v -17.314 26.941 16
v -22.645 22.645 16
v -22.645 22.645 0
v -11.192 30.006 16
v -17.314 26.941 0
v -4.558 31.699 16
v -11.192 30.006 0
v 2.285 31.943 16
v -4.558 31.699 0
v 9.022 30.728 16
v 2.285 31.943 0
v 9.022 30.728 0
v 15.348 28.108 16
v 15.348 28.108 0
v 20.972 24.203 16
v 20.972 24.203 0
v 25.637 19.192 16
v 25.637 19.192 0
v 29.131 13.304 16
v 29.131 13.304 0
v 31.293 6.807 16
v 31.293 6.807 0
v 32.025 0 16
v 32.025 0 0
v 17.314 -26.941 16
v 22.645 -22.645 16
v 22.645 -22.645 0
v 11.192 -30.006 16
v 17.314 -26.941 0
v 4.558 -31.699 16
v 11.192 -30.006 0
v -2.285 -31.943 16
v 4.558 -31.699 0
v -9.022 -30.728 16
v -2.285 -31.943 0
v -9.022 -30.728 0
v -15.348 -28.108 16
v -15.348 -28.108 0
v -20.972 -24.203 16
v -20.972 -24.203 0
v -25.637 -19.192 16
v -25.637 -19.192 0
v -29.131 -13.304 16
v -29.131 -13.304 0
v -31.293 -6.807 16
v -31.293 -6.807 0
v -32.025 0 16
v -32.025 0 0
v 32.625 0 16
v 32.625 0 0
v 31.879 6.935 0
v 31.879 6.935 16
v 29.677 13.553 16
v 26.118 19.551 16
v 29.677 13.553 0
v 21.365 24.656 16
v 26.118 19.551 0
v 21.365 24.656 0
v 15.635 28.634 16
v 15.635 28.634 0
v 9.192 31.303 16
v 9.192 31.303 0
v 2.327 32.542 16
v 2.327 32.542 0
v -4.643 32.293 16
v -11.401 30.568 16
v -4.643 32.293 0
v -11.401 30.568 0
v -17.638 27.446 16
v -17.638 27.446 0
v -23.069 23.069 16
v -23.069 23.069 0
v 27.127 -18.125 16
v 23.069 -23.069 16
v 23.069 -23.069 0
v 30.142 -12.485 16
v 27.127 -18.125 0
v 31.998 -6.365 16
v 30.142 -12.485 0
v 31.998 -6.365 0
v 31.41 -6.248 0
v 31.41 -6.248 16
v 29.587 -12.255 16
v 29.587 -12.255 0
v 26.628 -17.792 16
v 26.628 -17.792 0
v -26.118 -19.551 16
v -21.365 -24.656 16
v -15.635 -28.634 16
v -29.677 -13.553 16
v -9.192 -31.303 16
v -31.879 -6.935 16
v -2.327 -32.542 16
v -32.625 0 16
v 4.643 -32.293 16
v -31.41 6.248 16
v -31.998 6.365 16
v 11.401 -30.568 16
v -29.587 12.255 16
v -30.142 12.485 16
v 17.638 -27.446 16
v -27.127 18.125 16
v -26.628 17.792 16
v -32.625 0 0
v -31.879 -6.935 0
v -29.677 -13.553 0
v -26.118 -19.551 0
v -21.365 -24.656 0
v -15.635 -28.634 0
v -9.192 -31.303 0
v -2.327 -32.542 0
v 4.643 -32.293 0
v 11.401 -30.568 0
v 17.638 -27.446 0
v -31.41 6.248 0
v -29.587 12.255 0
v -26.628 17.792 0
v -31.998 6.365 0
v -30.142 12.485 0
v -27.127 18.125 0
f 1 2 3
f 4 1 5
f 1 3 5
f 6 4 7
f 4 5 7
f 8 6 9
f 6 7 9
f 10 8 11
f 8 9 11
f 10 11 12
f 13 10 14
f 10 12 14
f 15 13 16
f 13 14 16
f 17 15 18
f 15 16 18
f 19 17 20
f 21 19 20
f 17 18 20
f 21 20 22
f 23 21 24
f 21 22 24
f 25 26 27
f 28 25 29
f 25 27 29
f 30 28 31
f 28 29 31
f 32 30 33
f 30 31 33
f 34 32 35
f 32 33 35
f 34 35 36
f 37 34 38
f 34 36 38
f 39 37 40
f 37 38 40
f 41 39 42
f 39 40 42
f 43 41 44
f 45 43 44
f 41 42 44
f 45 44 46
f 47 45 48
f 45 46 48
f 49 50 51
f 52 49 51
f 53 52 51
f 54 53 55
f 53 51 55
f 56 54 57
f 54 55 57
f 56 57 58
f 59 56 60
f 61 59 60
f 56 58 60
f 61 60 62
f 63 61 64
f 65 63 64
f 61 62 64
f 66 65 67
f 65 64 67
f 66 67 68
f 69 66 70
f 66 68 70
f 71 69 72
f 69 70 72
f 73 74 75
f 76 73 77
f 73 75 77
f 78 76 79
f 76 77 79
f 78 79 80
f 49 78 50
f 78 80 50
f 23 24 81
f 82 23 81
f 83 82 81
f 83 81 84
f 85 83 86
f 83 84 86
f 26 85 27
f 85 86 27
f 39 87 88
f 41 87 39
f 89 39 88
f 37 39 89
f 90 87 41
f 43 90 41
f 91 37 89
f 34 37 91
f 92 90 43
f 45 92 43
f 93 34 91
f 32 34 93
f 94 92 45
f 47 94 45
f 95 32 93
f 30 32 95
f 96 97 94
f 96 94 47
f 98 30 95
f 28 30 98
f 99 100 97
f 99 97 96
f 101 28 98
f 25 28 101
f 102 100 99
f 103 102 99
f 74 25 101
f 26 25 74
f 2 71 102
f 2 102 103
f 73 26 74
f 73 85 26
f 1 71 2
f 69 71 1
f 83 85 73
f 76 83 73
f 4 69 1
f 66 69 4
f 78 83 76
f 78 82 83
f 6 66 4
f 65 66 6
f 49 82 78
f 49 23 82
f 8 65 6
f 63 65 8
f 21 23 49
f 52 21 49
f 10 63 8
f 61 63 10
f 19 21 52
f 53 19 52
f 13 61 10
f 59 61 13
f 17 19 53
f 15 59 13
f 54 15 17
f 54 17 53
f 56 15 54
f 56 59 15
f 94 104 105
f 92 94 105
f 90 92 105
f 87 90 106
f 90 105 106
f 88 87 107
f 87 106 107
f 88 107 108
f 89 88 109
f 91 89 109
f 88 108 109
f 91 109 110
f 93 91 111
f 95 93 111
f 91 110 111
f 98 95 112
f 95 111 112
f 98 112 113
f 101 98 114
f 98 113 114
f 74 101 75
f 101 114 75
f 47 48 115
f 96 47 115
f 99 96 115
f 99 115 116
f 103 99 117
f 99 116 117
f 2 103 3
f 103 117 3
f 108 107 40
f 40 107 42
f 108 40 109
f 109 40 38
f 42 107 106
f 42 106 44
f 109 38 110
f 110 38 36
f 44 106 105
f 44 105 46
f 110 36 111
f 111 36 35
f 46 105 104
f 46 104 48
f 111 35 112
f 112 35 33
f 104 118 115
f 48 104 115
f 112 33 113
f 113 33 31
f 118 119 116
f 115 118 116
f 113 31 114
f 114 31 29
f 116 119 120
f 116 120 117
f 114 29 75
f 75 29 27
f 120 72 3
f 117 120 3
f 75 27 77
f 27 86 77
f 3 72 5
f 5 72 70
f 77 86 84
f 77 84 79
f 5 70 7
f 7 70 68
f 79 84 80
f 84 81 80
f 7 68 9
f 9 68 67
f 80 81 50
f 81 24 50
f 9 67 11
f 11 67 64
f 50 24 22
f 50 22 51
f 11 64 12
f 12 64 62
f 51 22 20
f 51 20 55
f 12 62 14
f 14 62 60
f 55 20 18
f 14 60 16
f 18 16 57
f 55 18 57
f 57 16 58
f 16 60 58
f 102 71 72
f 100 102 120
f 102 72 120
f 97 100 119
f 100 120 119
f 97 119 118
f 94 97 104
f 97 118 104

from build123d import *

# Parameters (mm, degrees)
F1_DEPTH = 16


with BuildPart() as f1:
    # F0 (on Top) → F1 (new body)
    with BuildSketch(Plane.XY):
        with BuildLine():
            ThreePointArc((-23.069359, 23.069359), (-30.14157, 12.485047), (-32.625, 0))
            ThreePointArc((-32.625, 0), (-12.485047, -30.14157), (23.069359, -23.069359))
            ThreePointArc((23.069359, -23.069359), (30.14157, -12.485047), (32.625, 0))
            ThreePointArc((32.625, 0), (12.485047, 30.14157), (-23.069359, 23.069359))
        make_face()
        with BuildLine():
            ThreePointArc((-22.645095, 22.645095), (12.255437, 29.587242), (32.025, 0))
            ThreePointArc((32.025, 0), (29.587242, -12.255437), (22.645095, -22.645095))
            ThreePointArc((22.645095, -22.645095), (-12.255437, -29.587242), (-32.025, 0))
            ThreePointArc((-32.025, 0), (-29.587242, 12.255437), (-22.645095, 22.645095))
        make_face(mode=Mode.SUBTRACT)
    extrude(amount=F1_DEPTH)


solid = f1.part
